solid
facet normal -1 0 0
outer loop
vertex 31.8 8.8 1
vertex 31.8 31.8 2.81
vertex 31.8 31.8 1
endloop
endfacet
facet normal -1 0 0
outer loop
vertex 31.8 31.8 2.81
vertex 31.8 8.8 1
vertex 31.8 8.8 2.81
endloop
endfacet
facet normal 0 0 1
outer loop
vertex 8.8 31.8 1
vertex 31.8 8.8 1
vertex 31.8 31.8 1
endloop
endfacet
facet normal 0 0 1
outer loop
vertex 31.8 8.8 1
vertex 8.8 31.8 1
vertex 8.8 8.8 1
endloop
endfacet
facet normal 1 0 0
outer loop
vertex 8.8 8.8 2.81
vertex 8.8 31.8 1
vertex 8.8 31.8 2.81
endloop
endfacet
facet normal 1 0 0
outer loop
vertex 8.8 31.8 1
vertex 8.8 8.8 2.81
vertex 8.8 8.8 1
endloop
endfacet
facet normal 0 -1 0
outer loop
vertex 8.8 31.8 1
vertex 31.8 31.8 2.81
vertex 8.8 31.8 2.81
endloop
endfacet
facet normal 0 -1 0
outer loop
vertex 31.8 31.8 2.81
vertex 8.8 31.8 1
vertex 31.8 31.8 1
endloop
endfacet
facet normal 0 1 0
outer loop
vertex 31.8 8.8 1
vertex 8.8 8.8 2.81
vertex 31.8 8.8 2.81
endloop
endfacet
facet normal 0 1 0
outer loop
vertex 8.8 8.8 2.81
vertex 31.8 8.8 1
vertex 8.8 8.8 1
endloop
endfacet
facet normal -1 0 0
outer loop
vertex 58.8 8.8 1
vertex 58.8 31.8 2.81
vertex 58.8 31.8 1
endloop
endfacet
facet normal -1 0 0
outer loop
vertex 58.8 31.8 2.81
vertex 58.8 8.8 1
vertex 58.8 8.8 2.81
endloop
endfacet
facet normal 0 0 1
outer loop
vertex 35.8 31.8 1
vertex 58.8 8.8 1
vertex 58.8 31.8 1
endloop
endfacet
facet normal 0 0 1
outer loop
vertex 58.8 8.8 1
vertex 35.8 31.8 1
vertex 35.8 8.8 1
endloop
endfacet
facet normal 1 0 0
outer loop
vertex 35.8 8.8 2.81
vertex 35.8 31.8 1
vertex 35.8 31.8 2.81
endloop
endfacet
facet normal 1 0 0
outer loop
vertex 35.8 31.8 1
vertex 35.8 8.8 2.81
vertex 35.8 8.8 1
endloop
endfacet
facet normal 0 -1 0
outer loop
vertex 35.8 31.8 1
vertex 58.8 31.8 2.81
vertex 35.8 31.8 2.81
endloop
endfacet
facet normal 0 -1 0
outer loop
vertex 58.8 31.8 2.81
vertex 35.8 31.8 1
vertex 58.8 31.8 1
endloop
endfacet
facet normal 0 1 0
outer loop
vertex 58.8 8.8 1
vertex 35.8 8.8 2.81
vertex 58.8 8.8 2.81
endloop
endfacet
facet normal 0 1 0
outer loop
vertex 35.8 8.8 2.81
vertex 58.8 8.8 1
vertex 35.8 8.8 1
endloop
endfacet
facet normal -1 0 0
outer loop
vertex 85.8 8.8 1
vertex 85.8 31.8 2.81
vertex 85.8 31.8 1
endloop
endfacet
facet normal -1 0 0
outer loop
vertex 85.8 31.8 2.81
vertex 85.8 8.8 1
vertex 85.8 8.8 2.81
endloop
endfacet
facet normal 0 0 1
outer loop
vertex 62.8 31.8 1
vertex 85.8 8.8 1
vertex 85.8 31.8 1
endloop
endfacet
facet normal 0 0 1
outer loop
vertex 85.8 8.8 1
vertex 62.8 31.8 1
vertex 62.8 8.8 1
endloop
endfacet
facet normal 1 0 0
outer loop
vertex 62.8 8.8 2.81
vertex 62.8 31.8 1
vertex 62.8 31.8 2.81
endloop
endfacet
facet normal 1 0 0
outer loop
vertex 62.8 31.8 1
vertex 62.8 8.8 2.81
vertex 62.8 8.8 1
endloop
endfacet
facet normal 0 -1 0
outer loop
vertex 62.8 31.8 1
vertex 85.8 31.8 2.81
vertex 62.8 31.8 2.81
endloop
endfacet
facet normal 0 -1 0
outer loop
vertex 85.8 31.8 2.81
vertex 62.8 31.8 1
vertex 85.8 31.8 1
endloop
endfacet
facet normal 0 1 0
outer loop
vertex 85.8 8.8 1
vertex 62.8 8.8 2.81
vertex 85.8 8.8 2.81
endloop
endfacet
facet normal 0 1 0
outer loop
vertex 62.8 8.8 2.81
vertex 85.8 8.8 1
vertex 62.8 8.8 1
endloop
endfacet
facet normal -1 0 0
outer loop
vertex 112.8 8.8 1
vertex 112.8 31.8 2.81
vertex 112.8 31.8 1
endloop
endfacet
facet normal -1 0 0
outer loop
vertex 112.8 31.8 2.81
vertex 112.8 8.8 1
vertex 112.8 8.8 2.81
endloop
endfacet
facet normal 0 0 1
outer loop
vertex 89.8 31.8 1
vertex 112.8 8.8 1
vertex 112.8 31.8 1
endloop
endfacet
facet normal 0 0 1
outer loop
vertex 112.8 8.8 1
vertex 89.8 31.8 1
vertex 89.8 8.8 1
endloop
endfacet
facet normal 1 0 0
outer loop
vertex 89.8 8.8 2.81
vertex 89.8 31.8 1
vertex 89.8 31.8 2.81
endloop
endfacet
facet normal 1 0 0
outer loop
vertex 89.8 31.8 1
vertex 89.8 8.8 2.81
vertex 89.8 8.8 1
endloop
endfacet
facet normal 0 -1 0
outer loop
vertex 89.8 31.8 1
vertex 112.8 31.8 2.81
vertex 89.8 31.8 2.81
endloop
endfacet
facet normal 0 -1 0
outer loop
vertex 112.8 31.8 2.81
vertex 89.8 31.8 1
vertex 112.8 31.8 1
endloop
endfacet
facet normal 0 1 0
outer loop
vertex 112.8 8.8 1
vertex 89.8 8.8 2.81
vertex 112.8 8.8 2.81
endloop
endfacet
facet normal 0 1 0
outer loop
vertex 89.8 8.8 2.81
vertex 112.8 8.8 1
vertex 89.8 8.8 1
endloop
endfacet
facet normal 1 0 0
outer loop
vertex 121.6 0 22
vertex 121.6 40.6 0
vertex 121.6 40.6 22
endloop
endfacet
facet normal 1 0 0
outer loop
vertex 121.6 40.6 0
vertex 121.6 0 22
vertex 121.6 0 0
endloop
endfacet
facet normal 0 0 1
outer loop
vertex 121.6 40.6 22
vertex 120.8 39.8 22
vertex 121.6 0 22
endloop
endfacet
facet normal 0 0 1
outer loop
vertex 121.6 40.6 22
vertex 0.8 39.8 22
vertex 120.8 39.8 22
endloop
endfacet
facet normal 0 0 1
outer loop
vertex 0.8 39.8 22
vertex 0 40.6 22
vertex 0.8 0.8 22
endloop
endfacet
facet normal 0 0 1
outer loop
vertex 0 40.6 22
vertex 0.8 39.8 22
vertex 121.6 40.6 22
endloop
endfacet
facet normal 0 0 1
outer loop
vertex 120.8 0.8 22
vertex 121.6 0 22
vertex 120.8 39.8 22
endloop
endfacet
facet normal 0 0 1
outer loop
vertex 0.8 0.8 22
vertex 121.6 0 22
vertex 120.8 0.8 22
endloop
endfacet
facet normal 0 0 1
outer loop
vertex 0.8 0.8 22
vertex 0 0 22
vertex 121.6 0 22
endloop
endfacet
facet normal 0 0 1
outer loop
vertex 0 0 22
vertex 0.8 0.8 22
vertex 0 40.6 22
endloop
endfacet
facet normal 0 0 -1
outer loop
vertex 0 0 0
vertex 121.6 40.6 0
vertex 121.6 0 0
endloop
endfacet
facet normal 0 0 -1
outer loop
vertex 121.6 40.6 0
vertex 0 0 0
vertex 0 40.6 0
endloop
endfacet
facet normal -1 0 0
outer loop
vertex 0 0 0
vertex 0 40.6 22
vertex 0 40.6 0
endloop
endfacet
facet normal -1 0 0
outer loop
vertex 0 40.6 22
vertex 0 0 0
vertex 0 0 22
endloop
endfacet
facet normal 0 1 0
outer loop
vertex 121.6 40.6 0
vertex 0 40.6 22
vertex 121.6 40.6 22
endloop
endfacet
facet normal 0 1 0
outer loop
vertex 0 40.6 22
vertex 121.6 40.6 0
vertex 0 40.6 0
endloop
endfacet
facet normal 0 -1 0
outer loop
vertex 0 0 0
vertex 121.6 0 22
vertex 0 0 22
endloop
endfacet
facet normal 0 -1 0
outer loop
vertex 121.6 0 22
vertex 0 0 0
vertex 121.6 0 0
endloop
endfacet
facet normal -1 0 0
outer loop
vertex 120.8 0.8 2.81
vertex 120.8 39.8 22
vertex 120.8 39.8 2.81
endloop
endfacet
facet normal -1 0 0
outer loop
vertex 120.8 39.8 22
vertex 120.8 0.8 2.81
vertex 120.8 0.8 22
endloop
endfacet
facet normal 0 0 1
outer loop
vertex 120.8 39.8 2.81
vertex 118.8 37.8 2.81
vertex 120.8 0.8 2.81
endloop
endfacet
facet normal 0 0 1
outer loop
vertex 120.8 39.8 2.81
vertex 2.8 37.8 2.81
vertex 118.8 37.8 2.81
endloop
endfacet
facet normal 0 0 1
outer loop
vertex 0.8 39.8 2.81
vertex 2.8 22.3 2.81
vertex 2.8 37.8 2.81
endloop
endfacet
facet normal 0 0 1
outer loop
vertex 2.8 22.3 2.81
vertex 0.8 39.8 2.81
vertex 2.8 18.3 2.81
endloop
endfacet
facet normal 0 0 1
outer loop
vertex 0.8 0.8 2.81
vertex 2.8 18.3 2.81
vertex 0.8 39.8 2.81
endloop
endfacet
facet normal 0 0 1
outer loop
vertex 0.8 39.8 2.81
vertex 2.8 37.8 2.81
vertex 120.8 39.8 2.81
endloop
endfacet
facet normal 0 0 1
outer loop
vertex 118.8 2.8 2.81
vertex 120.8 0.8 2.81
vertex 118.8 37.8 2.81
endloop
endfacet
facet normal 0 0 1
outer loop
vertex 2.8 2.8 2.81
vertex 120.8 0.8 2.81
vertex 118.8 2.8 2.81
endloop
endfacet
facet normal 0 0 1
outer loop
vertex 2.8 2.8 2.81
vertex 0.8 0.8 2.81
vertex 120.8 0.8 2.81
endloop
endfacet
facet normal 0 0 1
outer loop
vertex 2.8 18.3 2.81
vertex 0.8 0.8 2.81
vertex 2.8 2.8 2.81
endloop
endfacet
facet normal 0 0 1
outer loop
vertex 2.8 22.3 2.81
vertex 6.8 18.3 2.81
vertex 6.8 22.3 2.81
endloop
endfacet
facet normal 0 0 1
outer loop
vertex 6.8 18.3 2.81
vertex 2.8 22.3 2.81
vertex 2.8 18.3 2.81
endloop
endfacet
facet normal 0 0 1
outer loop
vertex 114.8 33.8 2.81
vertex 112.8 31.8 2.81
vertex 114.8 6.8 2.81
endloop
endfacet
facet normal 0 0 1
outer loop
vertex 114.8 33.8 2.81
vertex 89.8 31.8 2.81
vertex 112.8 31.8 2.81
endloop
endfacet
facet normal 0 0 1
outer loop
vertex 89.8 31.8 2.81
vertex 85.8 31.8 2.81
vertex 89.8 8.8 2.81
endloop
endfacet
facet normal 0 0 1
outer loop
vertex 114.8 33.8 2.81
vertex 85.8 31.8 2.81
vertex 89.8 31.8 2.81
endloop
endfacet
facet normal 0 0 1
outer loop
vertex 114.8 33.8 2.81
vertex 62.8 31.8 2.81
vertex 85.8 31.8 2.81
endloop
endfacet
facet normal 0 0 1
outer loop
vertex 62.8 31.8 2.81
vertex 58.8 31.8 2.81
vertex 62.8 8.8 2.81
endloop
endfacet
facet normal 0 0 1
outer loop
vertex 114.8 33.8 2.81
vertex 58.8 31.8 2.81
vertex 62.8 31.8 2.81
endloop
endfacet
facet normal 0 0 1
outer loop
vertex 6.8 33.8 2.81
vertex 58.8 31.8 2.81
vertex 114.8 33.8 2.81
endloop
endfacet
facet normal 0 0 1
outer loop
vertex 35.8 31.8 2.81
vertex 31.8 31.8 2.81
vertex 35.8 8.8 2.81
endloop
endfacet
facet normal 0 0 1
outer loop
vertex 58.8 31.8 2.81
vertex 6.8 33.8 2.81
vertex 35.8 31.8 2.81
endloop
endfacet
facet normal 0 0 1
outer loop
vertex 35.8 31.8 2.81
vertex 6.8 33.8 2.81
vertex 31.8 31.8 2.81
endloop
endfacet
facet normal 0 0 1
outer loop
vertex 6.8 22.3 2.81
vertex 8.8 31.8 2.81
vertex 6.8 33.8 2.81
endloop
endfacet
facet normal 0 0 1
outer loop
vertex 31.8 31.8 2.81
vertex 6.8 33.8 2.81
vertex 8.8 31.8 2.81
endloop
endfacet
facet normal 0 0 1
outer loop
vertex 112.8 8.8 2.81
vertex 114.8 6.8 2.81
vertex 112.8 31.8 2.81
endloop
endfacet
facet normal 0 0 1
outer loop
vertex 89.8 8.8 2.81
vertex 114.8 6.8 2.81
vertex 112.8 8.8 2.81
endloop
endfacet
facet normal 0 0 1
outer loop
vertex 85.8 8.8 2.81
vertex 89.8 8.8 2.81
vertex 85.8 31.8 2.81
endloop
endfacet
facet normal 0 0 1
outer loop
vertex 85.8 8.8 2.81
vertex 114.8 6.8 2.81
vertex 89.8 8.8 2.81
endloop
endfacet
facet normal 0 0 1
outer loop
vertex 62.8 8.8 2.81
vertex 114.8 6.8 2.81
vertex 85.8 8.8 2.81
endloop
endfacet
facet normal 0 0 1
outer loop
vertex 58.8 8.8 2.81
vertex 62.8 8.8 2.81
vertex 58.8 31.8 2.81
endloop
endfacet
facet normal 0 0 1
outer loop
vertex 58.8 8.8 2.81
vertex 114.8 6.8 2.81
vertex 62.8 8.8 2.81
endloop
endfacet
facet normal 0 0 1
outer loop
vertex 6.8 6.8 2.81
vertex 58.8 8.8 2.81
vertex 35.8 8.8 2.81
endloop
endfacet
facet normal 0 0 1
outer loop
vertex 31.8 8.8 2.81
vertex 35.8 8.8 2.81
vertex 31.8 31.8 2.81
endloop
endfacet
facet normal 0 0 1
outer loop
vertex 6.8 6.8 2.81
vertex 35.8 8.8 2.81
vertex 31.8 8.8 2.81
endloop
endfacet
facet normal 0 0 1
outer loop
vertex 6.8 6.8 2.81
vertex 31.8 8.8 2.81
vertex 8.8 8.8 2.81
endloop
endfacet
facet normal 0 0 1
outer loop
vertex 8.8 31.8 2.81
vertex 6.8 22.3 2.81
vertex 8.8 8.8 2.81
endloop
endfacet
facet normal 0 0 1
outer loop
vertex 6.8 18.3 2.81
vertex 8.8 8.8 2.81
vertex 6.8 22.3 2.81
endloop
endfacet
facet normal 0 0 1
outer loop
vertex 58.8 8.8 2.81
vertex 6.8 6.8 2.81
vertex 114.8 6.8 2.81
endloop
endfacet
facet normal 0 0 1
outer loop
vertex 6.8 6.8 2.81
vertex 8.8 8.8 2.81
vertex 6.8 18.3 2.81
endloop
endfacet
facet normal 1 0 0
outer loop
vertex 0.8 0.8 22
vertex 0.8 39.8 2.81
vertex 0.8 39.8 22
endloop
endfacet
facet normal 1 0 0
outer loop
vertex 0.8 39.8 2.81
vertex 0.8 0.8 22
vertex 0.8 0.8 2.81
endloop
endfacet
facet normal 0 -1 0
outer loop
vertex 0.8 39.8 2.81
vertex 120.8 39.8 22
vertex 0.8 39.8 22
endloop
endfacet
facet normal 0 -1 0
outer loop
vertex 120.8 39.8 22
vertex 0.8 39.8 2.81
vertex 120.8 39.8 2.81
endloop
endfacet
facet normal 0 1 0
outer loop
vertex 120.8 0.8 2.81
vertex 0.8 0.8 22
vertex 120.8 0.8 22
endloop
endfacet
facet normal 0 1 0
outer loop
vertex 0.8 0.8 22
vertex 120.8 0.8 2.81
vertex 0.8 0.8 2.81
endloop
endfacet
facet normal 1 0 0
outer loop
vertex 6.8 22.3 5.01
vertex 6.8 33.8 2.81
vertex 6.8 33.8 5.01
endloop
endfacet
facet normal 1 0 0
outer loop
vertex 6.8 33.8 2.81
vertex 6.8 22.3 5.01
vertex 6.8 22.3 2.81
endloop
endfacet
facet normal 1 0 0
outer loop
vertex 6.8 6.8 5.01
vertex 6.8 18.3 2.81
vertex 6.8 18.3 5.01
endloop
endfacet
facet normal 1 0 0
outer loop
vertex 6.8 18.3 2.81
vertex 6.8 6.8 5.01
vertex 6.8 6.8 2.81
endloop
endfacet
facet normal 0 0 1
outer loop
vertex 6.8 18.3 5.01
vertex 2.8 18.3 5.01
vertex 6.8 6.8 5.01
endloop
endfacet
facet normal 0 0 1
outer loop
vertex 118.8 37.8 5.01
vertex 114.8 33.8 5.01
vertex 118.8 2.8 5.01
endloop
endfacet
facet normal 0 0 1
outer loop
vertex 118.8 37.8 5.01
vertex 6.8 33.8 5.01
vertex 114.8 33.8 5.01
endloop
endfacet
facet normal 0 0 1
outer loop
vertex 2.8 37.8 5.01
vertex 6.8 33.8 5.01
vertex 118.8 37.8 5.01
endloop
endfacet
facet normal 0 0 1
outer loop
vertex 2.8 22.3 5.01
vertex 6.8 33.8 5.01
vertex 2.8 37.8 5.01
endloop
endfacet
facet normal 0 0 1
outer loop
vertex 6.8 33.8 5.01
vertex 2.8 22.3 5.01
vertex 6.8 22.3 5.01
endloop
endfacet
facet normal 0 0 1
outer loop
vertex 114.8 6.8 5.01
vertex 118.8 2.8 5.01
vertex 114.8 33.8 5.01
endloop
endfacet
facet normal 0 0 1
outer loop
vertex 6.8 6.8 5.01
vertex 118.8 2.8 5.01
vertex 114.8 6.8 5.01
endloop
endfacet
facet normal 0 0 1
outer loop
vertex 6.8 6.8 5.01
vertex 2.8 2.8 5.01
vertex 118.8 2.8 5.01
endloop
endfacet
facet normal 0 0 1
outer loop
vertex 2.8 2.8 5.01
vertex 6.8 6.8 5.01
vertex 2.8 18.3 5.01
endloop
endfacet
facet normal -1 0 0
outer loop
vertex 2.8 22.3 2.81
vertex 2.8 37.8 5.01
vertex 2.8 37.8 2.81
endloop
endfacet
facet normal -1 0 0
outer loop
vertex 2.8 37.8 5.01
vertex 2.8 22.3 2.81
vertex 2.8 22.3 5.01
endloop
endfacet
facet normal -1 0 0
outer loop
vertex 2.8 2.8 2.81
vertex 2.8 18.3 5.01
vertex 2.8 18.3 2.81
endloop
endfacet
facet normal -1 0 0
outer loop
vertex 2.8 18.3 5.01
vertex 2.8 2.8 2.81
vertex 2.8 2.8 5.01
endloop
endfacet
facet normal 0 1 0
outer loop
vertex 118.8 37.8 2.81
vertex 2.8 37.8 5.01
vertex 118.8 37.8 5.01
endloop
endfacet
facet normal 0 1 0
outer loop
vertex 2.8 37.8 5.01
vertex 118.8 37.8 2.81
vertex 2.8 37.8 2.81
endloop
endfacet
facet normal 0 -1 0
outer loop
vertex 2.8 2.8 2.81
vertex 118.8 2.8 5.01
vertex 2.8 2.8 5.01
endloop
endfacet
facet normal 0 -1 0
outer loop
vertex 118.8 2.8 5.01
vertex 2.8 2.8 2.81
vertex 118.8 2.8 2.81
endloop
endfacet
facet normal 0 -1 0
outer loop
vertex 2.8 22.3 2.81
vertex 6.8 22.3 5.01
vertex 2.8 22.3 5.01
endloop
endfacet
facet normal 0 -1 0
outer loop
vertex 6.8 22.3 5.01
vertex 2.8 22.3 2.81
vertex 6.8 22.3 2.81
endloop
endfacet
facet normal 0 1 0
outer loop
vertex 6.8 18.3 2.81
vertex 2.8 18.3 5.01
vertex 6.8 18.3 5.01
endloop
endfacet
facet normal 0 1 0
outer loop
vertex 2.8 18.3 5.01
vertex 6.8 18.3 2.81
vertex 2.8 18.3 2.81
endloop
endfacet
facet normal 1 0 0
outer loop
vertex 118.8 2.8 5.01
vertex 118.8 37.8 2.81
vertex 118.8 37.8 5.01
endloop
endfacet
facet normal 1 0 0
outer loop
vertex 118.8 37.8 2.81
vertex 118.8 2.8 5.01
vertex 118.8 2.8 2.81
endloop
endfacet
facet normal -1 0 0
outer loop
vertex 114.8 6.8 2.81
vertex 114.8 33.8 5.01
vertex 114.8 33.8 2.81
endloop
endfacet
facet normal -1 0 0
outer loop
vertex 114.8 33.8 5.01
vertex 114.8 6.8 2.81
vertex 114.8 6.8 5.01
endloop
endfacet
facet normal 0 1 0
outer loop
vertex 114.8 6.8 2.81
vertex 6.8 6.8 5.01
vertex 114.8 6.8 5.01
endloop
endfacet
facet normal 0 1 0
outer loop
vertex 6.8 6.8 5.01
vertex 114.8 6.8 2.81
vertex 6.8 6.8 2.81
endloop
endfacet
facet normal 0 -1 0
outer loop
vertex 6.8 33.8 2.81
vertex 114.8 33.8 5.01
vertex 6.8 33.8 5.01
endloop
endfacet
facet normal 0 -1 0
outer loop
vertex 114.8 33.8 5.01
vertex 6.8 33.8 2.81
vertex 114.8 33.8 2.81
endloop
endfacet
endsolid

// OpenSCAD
// file: wall.scad
//units are in mm
$fn=20;

// Epsilon value
e = 0.01;

// Wall thickness
wall = .8;

// Outer border width
border = 8;

// Registration indent width
indent = 4;

box_width = 2*wall + 2*border + button_width * n + indent * (n-1);
box_length = 2*wall + 2*border + button_length;

difference() {
    // Bounding box
    cube([box_width, box_length, button_height]);

    // Hollow out box
    translate([wall, wall, 2 + wall + e])
        cube([box_width - 2*wall, box_length - 2*wall, button_height]);

    translate([wall + border, wall + border, 1]) {
        for(i=[0:n-1]) {
            translate([i * (button_width + indent), 0, 0])
                cube([button_width, button_length, button_height]);
        }
    }
}

difference() {
    translate([wall + (border - indent)/2, wall + (border - indent)/2, e])
        cube([indent, box_length - 2*wall - indent, 5]);
    translate([(border-indent)/2 + wall - e, box_length/2 - indent/2, 2+wall])
        cube([indent + 2*e, indent, button_height]);
}
translate([box_width - wall - (border+indent)/2, wall + (border - indent)/2, e])
    cube([indent, box_length - 2*wall - indent, 5]);
translate([wall + (border - indent)/2, wall + (border - indent)/2, e])
    cube([box_width - 2*wall - indent, indent, 5]);
translate([wall + (border - indent)/2, box_length - wall - (border + indent)/2, e])
    cube([box_width - 2*wall - indent, indent, 5]);
// main file
// Number of buttons
n = 4;

// Button size constants
button_width = 23;
button_length = 23;
button_height = 22;

include <wall.scad>
